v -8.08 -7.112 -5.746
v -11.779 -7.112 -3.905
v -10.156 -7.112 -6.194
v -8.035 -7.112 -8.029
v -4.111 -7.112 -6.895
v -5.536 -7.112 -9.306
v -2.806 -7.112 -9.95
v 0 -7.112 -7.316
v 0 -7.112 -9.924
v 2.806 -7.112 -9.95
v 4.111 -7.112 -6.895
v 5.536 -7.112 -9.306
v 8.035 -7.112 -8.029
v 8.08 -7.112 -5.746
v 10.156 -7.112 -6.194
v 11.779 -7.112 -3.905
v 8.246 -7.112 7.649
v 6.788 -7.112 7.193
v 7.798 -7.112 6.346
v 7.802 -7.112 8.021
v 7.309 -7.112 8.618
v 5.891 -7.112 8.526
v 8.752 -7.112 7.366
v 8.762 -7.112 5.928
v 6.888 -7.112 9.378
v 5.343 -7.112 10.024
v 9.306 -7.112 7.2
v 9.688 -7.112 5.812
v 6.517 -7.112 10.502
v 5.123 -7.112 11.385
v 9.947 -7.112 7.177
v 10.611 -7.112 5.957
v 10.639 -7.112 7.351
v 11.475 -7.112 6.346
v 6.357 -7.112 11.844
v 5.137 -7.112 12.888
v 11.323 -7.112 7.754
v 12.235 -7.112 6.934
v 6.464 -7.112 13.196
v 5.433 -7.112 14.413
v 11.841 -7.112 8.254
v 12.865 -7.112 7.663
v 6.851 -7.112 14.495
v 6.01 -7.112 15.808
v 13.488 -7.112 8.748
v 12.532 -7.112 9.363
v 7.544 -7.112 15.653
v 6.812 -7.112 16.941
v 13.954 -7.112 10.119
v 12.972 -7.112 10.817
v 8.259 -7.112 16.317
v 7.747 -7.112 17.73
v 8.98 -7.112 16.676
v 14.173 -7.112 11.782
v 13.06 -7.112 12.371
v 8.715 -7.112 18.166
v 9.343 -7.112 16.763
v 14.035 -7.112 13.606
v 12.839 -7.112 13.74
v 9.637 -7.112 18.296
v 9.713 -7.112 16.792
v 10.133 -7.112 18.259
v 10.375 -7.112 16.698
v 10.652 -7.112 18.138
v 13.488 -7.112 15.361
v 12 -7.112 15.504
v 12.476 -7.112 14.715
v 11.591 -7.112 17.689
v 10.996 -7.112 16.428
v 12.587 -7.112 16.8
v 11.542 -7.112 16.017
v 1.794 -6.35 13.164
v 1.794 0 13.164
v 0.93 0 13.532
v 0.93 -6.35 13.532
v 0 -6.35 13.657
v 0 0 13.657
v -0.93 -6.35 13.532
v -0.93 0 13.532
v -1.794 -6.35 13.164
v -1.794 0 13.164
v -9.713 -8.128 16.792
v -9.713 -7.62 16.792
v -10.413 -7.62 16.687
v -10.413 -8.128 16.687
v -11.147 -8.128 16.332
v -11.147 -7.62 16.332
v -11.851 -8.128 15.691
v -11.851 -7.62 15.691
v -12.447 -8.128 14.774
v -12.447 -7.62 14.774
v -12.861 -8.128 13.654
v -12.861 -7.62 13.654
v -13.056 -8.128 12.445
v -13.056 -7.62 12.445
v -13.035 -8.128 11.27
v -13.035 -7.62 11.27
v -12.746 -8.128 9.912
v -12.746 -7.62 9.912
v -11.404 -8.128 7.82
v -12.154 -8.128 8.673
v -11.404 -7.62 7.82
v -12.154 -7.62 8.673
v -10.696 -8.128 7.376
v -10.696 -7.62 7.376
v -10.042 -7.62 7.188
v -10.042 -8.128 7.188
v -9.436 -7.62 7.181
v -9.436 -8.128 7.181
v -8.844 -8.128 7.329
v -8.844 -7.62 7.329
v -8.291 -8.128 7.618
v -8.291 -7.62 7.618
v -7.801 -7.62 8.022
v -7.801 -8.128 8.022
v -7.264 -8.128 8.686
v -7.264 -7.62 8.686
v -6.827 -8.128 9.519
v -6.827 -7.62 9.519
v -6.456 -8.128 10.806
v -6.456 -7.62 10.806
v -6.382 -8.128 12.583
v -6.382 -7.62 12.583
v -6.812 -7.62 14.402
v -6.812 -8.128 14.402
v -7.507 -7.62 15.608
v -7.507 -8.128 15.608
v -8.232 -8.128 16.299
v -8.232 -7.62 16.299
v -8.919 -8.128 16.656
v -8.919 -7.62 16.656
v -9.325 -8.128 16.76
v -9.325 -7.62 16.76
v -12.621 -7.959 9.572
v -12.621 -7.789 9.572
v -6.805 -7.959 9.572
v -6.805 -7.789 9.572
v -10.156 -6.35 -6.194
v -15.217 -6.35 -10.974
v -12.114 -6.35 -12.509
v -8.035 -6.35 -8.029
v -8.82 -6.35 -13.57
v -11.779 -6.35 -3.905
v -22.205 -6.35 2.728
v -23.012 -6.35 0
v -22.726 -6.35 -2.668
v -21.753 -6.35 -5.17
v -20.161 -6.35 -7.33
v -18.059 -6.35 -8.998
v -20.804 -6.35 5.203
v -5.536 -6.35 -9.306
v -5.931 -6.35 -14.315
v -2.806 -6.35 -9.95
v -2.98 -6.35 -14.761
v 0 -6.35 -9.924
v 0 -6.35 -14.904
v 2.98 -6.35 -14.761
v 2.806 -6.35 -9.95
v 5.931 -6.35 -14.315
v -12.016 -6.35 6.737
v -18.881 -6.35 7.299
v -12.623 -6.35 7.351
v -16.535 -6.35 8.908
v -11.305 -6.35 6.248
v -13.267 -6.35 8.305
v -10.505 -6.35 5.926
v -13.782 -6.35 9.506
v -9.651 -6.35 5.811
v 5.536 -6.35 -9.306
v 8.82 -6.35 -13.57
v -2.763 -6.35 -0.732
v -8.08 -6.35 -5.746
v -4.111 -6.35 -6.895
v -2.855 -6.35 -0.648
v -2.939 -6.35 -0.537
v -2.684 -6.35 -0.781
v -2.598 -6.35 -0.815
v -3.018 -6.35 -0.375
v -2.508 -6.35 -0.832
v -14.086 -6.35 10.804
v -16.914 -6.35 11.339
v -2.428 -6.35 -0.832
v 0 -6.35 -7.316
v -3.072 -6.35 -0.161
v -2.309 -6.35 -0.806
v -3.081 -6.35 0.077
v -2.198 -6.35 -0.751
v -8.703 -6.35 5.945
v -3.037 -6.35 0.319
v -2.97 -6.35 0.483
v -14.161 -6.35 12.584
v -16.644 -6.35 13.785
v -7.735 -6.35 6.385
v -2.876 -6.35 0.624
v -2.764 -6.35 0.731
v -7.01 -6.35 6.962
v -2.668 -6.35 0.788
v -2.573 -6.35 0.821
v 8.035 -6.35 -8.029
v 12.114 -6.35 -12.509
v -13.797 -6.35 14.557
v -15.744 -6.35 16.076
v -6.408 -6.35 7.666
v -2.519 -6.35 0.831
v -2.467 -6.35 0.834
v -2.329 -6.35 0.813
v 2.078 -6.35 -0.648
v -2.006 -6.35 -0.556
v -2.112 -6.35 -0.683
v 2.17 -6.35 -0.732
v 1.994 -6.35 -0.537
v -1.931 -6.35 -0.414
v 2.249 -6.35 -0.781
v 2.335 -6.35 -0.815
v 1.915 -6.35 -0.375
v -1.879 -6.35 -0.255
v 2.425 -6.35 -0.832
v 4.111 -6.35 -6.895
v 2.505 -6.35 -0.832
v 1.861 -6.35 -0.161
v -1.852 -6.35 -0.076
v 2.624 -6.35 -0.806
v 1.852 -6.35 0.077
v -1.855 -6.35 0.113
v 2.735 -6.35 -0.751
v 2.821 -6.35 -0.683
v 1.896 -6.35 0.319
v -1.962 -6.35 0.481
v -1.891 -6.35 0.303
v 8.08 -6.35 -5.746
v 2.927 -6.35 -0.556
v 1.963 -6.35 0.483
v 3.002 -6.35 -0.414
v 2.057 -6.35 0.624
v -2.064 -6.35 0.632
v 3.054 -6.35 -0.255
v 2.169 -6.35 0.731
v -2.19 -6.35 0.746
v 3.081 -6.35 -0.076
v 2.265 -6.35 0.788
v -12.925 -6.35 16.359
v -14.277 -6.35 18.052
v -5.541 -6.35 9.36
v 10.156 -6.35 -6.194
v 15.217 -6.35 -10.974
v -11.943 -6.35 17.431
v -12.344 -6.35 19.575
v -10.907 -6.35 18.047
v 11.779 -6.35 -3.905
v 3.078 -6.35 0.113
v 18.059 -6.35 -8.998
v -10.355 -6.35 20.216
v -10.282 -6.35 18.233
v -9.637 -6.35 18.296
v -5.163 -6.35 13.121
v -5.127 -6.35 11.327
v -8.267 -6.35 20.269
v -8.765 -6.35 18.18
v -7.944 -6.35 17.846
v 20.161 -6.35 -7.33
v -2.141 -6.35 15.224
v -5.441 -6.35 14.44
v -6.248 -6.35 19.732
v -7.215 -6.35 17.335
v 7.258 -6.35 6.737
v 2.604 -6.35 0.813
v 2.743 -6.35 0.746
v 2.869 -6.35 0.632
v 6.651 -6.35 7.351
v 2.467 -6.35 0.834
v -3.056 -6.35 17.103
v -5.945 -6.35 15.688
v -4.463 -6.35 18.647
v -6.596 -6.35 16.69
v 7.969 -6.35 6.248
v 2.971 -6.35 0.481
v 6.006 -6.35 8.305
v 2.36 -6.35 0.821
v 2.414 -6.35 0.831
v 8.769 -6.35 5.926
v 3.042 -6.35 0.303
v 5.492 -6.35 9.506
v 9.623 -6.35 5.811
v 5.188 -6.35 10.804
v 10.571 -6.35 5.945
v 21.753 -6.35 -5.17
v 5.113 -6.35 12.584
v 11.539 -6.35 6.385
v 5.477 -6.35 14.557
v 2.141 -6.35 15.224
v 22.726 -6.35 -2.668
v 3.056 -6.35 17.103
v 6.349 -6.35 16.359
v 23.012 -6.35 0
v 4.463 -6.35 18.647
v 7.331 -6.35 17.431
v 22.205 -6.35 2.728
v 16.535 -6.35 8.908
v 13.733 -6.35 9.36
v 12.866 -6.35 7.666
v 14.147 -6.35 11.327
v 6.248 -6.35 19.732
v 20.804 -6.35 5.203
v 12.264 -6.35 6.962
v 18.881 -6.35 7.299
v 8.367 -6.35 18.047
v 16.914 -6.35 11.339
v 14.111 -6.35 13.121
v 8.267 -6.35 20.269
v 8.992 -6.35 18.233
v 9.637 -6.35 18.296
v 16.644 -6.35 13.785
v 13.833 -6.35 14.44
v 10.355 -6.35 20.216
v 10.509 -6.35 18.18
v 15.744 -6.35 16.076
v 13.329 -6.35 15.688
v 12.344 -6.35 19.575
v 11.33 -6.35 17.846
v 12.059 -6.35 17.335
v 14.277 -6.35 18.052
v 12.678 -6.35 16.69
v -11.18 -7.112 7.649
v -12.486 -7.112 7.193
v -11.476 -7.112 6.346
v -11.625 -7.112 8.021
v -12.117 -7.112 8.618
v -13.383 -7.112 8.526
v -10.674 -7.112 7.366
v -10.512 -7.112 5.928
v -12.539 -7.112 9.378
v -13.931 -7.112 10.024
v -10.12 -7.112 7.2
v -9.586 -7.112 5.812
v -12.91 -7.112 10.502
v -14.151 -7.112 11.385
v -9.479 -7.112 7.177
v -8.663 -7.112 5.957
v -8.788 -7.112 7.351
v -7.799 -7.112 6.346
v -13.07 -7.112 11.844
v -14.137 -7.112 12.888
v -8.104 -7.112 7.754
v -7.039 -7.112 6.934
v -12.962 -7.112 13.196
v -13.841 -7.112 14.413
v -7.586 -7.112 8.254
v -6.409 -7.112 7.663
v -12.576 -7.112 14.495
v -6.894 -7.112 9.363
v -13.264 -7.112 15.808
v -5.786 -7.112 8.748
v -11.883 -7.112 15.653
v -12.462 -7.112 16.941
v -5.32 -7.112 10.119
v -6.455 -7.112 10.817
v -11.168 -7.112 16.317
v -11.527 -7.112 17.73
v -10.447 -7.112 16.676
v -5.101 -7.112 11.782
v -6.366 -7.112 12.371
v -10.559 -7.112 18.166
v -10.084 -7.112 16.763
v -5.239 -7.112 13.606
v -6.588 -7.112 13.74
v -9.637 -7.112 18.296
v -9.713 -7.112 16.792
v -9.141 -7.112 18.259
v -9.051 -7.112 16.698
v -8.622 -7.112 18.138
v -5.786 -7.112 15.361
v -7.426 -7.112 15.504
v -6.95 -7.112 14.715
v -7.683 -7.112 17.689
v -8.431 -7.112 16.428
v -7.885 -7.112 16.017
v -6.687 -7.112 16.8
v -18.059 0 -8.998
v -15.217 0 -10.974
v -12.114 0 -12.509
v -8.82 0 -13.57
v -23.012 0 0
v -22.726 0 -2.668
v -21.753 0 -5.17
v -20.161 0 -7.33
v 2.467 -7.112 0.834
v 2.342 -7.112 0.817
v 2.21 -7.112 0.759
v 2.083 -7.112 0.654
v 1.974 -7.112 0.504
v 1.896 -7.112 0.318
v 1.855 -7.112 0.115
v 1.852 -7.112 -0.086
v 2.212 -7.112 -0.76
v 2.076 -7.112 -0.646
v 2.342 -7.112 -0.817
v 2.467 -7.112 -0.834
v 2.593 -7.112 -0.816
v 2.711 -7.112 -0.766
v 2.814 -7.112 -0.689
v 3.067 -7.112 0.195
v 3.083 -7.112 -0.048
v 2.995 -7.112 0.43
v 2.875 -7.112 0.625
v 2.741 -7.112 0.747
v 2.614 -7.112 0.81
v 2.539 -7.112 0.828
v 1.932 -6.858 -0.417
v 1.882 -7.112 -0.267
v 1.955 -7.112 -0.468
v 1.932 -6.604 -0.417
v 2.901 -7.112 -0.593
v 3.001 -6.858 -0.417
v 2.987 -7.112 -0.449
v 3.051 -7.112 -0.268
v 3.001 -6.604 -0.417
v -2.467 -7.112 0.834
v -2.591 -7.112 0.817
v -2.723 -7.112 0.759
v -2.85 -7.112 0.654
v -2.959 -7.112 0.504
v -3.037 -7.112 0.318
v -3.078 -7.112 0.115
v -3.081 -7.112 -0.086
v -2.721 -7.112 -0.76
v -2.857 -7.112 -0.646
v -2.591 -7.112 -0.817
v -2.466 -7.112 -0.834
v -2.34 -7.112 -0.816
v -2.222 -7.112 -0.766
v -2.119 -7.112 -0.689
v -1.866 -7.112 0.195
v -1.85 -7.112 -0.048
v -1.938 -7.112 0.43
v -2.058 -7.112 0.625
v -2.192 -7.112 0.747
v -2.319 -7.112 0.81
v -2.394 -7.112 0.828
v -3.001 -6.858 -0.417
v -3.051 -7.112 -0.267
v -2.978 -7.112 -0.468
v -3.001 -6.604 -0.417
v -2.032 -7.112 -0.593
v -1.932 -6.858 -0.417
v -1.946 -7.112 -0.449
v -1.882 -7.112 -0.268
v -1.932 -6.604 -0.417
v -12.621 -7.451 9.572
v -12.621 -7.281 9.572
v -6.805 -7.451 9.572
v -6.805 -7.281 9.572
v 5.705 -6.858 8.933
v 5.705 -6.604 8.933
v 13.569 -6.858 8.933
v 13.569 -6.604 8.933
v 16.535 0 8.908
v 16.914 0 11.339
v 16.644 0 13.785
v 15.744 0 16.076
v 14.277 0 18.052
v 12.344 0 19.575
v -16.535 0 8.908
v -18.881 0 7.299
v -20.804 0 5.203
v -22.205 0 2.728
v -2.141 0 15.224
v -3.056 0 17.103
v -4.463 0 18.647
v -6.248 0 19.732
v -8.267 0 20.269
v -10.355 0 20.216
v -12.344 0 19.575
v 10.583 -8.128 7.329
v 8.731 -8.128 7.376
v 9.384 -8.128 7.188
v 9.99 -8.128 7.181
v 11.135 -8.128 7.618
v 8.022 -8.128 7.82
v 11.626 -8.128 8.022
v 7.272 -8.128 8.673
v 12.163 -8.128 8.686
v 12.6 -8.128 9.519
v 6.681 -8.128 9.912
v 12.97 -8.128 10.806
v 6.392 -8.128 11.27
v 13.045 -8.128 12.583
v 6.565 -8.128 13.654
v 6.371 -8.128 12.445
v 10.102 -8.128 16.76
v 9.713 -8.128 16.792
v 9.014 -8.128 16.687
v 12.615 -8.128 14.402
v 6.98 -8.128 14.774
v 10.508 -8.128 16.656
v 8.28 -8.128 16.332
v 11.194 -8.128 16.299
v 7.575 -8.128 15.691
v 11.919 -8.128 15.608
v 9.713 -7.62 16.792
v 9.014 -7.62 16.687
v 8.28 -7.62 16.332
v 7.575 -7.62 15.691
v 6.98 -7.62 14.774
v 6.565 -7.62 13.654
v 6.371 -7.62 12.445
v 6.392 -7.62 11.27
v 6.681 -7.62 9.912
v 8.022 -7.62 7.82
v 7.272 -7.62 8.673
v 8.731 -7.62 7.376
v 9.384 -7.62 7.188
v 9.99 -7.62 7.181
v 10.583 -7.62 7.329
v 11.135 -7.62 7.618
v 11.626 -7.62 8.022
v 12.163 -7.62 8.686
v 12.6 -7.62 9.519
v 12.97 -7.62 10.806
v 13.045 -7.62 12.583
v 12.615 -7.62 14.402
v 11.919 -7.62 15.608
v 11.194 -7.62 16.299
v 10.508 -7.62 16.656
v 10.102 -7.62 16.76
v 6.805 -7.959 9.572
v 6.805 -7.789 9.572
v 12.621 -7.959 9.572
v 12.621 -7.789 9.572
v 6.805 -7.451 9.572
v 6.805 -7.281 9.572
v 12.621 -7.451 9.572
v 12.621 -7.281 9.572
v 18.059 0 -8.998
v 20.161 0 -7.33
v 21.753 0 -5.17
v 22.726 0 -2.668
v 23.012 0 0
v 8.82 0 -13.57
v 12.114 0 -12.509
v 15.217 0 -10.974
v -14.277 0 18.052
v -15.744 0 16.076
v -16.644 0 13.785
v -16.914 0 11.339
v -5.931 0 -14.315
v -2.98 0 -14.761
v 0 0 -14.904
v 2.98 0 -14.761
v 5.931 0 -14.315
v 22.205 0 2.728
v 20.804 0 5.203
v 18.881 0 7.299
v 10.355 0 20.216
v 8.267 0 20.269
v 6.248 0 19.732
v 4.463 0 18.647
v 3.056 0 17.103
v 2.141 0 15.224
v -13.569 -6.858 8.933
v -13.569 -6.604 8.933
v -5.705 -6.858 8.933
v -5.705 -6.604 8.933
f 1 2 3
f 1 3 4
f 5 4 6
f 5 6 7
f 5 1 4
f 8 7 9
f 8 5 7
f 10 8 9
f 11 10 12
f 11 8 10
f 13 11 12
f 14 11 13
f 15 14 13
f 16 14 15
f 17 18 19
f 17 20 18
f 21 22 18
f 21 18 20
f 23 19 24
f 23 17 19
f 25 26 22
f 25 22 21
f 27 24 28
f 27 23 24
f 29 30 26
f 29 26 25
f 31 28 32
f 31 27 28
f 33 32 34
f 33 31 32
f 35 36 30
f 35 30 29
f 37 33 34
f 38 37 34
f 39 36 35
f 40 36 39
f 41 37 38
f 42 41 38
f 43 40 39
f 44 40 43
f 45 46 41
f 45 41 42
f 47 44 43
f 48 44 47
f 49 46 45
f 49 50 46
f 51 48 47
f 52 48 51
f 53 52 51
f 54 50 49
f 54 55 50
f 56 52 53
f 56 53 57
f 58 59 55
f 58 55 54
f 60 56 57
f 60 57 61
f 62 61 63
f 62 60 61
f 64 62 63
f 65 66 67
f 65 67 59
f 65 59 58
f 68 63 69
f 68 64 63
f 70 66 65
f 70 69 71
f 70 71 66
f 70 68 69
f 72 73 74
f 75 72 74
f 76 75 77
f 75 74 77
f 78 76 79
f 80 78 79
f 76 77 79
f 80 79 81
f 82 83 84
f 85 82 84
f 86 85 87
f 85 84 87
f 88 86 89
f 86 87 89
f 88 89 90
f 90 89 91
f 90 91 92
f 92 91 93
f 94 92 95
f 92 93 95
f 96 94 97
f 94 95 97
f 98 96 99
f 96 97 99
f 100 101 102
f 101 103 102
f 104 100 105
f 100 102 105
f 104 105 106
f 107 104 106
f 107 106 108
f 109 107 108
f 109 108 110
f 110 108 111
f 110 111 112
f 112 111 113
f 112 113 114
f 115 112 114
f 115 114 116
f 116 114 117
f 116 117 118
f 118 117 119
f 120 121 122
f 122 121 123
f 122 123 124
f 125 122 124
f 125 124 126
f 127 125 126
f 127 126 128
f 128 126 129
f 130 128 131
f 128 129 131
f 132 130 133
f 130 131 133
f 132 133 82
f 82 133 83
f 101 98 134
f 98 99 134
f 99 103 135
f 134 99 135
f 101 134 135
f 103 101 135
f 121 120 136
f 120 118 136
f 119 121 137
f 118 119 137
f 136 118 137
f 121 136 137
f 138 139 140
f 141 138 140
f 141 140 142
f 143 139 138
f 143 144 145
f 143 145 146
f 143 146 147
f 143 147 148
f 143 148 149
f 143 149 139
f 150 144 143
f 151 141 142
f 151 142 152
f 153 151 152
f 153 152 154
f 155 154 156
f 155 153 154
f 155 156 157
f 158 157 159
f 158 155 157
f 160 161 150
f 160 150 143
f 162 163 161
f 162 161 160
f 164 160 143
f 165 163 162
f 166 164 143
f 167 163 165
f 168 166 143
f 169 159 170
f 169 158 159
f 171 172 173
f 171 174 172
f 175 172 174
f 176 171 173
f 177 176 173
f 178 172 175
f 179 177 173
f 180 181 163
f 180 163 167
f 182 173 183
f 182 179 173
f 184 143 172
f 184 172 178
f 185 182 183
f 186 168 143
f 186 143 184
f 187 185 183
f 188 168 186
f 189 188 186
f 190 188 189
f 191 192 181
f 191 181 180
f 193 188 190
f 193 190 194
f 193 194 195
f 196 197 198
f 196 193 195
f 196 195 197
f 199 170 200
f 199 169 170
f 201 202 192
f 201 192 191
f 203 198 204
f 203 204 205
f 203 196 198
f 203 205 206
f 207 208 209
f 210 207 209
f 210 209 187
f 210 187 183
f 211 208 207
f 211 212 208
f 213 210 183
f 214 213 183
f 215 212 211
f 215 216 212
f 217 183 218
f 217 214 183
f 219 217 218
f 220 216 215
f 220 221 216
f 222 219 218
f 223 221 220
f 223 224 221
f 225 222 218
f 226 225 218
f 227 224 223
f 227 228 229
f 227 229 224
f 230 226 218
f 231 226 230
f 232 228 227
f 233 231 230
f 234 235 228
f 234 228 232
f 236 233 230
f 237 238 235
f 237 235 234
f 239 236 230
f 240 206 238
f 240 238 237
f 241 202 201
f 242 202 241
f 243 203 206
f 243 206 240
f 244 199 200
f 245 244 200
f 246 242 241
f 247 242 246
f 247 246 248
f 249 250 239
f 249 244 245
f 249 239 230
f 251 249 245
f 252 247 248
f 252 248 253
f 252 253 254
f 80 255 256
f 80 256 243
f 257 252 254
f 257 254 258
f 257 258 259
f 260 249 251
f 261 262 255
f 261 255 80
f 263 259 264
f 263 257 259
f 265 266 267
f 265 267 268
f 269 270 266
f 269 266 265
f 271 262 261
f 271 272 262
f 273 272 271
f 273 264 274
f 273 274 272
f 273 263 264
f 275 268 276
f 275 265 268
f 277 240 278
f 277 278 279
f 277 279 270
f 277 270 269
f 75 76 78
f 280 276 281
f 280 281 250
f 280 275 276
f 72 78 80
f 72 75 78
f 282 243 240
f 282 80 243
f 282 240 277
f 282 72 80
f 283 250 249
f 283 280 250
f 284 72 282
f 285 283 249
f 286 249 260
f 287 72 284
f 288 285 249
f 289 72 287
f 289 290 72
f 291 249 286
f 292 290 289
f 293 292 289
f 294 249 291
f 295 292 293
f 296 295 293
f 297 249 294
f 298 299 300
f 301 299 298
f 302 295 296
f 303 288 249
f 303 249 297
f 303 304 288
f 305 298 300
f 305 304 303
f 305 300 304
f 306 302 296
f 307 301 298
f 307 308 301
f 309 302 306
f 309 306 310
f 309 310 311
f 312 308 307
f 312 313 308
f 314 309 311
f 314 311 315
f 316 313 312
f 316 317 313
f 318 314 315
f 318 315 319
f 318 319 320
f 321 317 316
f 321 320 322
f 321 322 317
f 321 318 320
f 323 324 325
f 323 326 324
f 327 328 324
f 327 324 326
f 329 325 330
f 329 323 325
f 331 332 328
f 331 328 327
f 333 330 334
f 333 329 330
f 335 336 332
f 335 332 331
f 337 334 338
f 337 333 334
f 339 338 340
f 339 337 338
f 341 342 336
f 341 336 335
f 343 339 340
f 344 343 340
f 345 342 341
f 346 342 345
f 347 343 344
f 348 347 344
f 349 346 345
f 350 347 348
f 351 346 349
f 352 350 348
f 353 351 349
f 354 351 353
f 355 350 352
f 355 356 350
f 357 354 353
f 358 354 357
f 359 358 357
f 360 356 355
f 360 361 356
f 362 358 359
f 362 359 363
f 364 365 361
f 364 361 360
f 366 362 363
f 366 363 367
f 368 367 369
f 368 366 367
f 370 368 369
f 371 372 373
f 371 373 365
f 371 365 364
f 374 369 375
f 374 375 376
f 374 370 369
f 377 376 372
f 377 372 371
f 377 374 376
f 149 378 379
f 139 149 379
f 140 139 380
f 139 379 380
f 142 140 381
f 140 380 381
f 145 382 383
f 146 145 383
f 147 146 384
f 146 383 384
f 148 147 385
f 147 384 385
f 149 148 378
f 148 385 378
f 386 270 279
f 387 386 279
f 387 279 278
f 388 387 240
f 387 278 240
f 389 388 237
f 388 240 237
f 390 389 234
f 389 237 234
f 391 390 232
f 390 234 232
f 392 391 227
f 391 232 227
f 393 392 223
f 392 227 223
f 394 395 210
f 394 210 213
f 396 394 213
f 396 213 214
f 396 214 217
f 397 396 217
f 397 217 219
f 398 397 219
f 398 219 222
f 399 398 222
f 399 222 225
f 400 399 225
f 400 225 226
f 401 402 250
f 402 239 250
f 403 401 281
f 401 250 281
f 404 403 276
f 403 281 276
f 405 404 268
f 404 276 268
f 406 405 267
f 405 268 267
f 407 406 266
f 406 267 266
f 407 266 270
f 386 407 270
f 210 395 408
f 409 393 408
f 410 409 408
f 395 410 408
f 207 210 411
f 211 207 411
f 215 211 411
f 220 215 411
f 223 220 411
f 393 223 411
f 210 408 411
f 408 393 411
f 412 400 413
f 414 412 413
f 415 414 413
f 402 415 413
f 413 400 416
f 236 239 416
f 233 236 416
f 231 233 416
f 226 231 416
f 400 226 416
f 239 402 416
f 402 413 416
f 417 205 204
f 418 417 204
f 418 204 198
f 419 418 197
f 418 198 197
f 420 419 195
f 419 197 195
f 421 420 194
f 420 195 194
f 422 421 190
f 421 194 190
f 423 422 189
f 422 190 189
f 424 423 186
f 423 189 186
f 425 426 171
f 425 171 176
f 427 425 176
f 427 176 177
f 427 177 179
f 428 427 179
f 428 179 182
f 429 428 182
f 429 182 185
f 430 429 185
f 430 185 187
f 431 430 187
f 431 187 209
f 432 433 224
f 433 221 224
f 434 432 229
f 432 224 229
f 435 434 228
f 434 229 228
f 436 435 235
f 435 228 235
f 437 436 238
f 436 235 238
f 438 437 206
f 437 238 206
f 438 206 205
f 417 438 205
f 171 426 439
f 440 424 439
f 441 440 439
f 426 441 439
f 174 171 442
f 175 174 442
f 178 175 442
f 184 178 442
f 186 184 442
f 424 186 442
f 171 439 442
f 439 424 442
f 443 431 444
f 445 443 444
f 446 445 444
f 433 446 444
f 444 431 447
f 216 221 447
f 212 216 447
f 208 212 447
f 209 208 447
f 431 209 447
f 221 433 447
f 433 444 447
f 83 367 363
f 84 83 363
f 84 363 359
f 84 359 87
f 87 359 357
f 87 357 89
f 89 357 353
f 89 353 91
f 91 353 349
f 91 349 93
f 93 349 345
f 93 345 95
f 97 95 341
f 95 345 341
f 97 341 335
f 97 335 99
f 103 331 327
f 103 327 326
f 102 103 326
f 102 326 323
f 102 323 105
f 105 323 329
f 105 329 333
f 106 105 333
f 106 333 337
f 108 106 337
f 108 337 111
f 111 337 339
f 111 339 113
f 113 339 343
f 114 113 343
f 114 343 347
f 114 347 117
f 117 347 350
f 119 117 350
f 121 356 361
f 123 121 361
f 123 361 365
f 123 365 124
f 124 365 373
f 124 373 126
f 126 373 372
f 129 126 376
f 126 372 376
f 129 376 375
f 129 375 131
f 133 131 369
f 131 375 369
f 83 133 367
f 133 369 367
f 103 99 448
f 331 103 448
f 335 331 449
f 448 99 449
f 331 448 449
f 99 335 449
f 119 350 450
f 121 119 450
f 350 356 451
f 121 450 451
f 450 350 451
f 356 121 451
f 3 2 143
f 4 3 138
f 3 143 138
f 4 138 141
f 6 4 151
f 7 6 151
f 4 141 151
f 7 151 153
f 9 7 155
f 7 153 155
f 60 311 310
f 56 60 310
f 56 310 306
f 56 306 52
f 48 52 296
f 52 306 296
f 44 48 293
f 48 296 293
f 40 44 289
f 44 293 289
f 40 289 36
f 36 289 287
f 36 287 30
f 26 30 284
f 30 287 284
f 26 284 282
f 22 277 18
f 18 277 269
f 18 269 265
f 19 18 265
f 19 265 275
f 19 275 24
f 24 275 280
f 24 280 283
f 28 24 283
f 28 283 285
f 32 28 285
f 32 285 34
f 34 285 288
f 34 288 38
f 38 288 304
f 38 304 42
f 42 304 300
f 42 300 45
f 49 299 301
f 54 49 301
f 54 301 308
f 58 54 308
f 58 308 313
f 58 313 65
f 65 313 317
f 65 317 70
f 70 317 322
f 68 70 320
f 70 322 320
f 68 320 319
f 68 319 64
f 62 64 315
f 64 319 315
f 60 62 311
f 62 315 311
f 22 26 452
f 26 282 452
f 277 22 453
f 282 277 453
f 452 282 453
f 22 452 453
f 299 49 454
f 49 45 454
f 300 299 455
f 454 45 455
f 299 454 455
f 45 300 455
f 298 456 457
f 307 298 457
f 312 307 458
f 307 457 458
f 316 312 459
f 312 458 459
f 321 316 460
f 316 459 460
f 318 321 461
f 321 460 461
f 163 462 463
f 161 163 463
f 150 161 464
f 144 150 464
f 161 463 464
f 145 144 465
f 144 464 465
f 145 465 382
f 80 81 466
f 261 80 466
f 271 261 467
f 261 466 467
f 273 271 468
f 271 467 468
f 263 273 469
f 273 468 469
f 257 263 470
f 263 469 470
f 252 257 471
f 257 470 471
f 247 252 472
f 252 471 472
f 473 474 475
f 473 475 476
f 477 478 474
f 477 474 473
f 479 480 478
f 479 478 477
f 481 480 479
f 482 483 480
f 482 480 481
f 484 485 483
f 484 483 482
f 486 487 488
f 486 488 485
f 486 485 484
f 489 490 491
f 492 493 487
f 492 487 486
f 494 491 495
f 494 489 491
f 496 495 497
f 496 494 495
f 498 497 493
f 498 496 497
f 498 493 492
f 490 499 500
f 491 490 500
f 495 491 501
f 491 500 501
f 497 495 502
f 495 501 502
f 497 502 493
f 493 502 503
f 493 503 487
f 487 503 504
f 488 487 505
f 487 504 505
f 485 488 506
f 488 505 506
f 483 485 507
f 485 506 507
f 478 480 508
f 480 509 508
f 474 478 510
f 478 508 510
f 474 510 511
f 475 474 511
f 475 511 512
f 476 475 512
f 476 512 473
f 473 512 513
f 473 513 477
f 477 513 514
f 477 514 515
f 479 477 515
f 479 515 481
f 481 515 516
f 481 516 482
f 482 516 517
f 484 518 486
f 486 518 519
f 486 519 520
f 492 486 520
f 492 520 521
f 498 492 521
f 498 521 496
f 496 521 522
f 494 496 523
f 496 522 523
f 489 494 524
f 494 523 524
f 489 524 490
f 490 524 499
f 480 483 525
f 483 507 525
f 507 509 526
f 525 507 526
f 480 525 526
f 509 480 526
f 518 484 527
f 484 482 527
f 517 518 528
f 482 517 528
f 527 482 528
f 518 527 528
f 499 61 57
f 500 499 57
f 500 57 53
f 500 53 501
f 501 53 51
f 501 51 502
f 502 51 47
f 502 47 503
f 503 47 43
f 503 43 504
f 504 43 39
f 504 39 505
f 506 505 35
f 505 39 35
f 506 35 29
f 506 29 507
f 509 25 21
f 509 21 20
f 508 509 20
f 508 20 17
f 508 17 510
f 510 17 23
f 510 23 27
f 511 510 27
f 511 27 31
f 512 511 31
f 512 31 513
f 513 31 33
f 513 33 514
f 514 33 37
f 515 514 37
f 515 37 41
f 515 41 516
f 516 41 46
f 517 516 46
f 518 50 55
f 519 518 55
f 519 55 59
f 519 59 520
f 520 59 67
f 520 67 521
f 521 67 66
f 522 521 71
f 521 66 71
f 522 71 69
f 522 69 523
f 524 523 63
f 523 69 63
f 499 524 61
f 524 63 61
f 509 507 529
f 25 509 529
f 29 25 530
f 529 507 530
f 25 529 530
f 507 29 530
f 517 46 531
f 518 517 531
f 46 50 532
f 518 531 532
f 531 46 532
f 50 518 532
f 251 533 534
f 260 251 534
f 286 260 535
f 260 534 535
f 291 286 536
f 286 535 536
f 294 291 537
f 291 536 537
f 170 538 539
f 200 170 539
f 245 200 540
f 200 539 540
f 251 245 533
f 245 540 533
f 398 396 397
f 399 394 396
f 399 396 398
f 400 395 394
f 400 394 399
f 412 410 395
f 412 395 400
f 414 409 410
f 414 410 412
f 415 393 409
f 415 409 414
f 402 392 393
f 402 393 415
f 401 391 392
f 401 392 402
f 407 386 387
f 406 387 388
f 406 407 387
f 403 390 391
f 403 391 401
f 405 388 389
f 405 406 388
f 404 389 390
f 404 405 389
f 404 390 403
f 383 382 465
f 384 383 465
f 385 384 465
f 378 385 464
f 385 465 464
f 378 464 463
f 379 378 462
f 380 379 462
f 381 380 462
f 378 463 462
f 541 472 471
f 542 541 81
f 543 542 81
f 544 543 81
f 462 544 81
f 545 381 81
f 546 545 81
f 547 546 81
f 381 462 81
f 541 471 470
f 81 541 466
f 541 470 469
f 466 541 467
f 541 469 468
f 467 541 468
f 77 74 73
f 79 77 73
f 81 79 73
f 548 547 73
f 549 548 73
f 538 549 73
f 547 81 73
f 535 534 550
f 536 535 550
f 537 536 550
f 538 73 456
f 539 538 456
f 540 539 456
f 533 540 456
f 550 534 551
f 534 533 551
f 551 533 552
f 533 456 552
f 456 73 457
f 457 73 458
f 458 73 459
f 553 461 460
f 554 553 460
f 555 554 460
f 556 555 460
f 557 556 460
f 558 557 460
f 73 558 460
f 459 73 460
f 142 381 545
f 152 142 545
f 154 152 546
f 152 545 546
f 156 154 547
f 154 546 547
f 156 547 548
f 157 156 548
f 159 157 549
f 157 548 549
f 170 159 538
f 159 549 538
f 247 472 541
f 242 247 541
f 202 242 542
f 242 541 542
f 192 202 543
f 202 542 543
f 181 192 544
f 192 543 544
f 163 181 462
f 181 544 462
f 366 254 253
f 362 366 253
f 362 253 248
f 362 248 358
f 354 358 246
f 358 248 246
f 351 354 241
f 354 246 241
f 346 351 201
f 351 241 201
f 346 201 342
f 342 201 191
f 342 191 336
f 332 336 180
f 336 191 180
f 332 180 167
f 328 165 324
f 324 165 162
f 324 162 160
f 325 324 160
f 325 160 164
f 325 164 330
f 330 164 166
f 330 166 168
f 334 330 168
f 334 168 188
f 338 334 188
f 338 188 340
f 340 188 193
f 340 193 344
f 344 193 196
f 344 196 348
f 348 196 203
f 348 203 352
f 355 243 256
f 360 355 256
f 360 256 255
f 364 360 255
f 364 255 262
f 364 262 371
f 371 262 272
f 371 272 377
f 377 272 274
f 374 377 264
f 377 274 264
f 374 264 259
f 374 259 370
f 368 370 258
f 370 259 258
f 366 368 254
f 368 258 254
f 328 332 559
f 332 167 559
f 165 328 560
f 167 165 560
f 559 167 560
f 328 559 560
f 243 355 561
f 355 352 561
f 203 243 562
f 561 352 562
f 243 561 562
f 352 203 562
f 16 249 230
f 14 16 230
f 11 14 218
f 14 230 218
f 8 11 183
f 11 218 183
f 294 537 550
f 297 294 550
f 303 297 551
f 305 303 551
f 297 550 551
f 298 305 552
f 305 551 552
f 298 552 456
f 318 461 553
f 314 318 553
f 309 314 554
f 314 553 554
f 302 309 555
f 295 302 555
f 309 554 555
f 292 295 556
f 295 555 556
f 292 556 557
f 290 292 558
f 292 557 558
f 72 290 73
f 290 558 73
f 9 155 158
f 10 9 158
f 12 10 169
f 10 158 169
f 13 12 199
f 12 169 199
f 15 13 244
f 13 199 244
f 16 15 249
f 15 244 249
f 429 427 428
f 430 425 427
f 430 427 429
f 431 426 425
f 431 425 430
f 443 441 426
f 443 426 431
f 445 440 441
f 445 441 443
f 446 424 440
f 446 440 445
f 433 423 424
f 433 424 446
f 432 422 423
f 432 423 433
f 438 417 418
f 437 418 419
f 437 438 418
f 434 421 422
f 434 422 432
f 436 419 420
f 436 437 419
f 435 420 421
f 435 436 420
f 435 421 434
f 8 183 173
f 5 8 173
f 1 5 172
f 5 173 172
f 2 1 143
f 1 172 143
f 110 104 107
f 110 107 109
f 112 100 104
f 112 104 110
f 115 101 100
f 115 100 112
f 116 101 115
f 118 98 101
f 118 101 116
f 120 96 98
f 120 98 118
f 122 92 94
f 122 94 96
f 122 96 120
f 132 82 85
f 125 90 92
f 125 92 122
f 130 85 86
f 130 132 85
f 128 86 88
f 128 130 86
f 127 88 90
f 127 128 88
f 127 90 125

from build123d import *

# Parameters (mm, degrees)
F1_DEPTH = 6.35
F3_DEPTH = 7.112
F5_DEPTH = 7.62
F6_DEPTH = 8.128


with BuildPart() as f1:
    # F0 (on Front) → F1 (new body)
    with BuildSketch(Plane.XZ):
        with BuildLine():
            ThreePointArc((1.7938007368, 13.1640341133), (0, 13.6572233107), (-1.7938007368, 13.1640341133))
            ThreePointArc((-1.7938007368, 13.1640341133), (-5.3164680529, 19.2534781495), (-12.3440632597, 19.5750668645))
            ThreePointArc((-12.3440632597, 19.5750668645), (-16.2697935097, 14.9604002099), (-16.5348500013, 8.9076114818))
            ThreePointArc((-16.5348500013, 8.9076114818), (-20.8041441001, 5.2034101528), (-23.0115186423, 0))
            ThreePointArc((-23.0115186423, 0), (-21.7531756781, -5.1696394341), (-18.0587712675, -8.9984741062))
            ThreePointArc((-18.0587712675, -8.9984741062), (-13.693909696, -11.7987149183), (-8.8199935853, -13.5702416301))
            ThreePointArc((-8.8199935853, -13.5702416301), (-4.4612425903, -14.5759230892), (0, -14.9036729708))
            ThreePointArc((0, -14.9036729708), (4.4612425903, -14.5759230892), (8.8199935853, -13.5702416301))
            ThreePointArc((8.8199935853, -13.5702416301), (13.693909696, -11.7987149183), (18.0587712675, -8.9984741062))
            ThreePointArc((18.0587712675, -8.9984741062), (21.7531756781, -5.1696394341), (23.0115186423, 0))
            ThreePointArc((23.0115186423, 0), (20.8041441001, 5.2034101528), (16.5348500013, 8.9076114818))
            ThreePointArc((16.5348500013, 8.9076114818), (16.2697935097, 14.9604002099), (12.3440632597, 19.5750668645))
            ThreePointArc((12.3440632597, 19.5750668645), (5.3164680529, 19.2534781495), (1.7938007368, 13.1640341133))
        make_face()
    extrude(amount=F1_DEPTH)

    # F2 (on Front) → F3 (join)
    with BuildSketch(Plane.XZ):
        with BuildLine():
            add(Edge.make_bspline(
                [(-9.6370028332, 18.2963684201), (-17.5014538427, 18.2963684201), (-13.569228338, 8.9325434528), (-9.6370028332, -0.4312815145), (-5.7047773284, 8.9325434528), (-1.7725518236, 18.2963684201), (-9.6370028332, 18.2963684201)],
                knots=[0, 0, 0, 2.0943951024, 2.0943951024, 4.1887902048, 4.1887902048, 6.2831853072, 6.2831853072, 6.2831853072], degree=2, weights=[1, 0.5, 1, 0.5, 1, 0.5, 1]))
        make_face()
        with BuildLine():
            add(Edge.make_bspline(
                [(-2.4665053934, 0.8340993081), (-3.5359200187, 0.8340993081), (-3.001212706, -0.4170496541), (-2.4665053934, -1.6681986162), (-1.9317980807, -0.4170496541), (-1.3970907681, 0.8340993081), (-2.4665053934, 0.8340993081)],
                knots=[0, 0, 0, 2.0943951024, 2.0943951024, 4.1887902048, 4.1887902048, 6.2831853072, 6.2831853072, 6.2831853072], degree=2, weights=[1, 0.5, 1, 0.5, 1, 0.5, 1]))
        make_face()
        with BuildLine():
            add(Edge.make_bspline(
                [(9.6370028332, 18.2963684201), (1.7725518236, 18.2963684201), (5.7047773284, 8.9325434528), (9.6370028332, -0.4312815145), (13.569228338, 8.9325434528), (17.5014538427, 18.2963684201), (9.6370028332, 18.2963684201)],
                knots=[0, 0, 0, 2.0943951024, 2.0943951024, 4.1887902048, 4.1887902048, 6.2831853072, 6.2831853072, 6.2831853072], degree=2, weights=[1, 0.5, 1, 0.5, 1, 0.5, 1]))
        make_face()
        with BuildLine():
            add(Edge.make_bspline(
                [(2.4665053934, 0.8340993081), (1.3970907681, 0.8340993081), (1.9317980807, -0.4170496541), (2.4665053934, -1.6681986162), (3.001212706, -0.4170496541), (3.5359200187, 0.8340993081), (2.4665053934, 0.8340993081)],
                knots=[0, 0, 0, 2.0943951024, 2.0943951024, 4.1887902048, 4.1887902048, 6.2831853072, 6.2831853072, 6.2831853072], degree=2, weights=[1, 0.5, 1, 0.5, 1, 0.5, 1]))
        make_face()
        with BuildLine():
            ThreePointArc((0, -7.315651048), (-6.1209625513, -6.4094895832), (-11.7790261284, -3.9047684986))
            ThreePointArc((-11.7790261284, -3.9047684986), (-6.8239147975, -8.7429084856), (0, -9.9239731207))
            ThreePointArc((0, -9.9239731207), (6.8239147975, -8.7429084856), (11.7790261284, -3.9047684986))
            ThreePointArc((11.7790261284, -3.9047684986), (6.1209625513, -6.4094895832), (0, -7.315651048))
        make_face()
    extrude(amount=F3_DEPTH)

    # F4 (on Front) → F5 (join)
    with BuildSketch(Plane.XZ):
        with BuildLine():
            add(Edge.make_bspline(
                [(-9.7133507952, 16.7924873531), (-15.5296298908, 16.7924873531), (-12.621490343, 9.5717669465), (-9.7133507952, 2.3510465398), (-6.8052112474, 9.5717669465), (-3.8970716996, 16.7924873531), (-9.7133507952, 16.7924873531)],
                knots=[0, 0, 0, 2.0943951024, 2.0943951024, 4.1887902048, 4.1887902048, 6.2831853072, 6.2831853072, 6.2831853072], degree=2, weights=[1, 0.5, 1, 0.5, 1, 0.5, 1]))
        make_face()
        with BuildLine():
            add(Edge.make_bspline(
                [(9.7133507952, 16.7924873531), (3.8970716996, 16.7924873531), (6.8052112474, 9.5717669465), (9.7133507952, 2.3510465398), (12.621490343, 9.5717669465), (15.5296298908, 16.7924873531), (9.7133507952, 16.7924873531)],
                knots=[0, 0, 0, 2.0943951024, 2.0943951024, 4.1887902048, 4.1887902048, 6.2831853072, 6.2831853072, 6.2831853072], degree=2, weights=[1, 0.5, 1, 0.5, 1, 0.5, 1]))
        make_face()
    extrude(amount=F5_DEPTH)

    # F4 (on Front) → F6 (join)
    with BuildSketch(Plane.XZ):
        with BuildLine():
            add(Edge.make_bspline(
                [(-9.7133507952, 16.7924873531), (-15.5296298908, 16.7924873531), (-12.621490343, 9.5717669465), (-9.7133507952, 2.3510465398), (-6.8052112474, 9.5717669465), (-3.8970716996, 16.7924873531), (-9.7133507952, 16.7924873531)],
                knots=[0, 0, 0, 2.0943951024, 2.0943951024, 4.1887902048, 4.1887902048, 6.2831853072, 6.2831853072, 6.2831853072], degree=2, weights=[1, 0.5, 1, 0.5, 1, 0.5, 1]))
        make_face()
        with BuildLine():
            add(Edge.make_bspline(
                [(9.7133507952, 16.7924873531), (3.8970716996, 16.7924873531), (6.8052112474, 9.5717669465), (9.7133507952, 2.3510465398), (12.621490343, 9.5717669465), (15.5296298908, 16.7924873531), (9.7133507952, 16.7924873531)],
                knots=[0, 0, 0, 2.0943951024, 2.0943951024, 4.1887902048, 4.1887902048, 6.2831853072, 6.2831853072, 6.2831853072], degree=2, weights=[1, 0.5, 1, 0.5, 1, 0.5, 1]))
        make_face()
    extrude(amount=F6_DEPTH)


solid = f1.part
